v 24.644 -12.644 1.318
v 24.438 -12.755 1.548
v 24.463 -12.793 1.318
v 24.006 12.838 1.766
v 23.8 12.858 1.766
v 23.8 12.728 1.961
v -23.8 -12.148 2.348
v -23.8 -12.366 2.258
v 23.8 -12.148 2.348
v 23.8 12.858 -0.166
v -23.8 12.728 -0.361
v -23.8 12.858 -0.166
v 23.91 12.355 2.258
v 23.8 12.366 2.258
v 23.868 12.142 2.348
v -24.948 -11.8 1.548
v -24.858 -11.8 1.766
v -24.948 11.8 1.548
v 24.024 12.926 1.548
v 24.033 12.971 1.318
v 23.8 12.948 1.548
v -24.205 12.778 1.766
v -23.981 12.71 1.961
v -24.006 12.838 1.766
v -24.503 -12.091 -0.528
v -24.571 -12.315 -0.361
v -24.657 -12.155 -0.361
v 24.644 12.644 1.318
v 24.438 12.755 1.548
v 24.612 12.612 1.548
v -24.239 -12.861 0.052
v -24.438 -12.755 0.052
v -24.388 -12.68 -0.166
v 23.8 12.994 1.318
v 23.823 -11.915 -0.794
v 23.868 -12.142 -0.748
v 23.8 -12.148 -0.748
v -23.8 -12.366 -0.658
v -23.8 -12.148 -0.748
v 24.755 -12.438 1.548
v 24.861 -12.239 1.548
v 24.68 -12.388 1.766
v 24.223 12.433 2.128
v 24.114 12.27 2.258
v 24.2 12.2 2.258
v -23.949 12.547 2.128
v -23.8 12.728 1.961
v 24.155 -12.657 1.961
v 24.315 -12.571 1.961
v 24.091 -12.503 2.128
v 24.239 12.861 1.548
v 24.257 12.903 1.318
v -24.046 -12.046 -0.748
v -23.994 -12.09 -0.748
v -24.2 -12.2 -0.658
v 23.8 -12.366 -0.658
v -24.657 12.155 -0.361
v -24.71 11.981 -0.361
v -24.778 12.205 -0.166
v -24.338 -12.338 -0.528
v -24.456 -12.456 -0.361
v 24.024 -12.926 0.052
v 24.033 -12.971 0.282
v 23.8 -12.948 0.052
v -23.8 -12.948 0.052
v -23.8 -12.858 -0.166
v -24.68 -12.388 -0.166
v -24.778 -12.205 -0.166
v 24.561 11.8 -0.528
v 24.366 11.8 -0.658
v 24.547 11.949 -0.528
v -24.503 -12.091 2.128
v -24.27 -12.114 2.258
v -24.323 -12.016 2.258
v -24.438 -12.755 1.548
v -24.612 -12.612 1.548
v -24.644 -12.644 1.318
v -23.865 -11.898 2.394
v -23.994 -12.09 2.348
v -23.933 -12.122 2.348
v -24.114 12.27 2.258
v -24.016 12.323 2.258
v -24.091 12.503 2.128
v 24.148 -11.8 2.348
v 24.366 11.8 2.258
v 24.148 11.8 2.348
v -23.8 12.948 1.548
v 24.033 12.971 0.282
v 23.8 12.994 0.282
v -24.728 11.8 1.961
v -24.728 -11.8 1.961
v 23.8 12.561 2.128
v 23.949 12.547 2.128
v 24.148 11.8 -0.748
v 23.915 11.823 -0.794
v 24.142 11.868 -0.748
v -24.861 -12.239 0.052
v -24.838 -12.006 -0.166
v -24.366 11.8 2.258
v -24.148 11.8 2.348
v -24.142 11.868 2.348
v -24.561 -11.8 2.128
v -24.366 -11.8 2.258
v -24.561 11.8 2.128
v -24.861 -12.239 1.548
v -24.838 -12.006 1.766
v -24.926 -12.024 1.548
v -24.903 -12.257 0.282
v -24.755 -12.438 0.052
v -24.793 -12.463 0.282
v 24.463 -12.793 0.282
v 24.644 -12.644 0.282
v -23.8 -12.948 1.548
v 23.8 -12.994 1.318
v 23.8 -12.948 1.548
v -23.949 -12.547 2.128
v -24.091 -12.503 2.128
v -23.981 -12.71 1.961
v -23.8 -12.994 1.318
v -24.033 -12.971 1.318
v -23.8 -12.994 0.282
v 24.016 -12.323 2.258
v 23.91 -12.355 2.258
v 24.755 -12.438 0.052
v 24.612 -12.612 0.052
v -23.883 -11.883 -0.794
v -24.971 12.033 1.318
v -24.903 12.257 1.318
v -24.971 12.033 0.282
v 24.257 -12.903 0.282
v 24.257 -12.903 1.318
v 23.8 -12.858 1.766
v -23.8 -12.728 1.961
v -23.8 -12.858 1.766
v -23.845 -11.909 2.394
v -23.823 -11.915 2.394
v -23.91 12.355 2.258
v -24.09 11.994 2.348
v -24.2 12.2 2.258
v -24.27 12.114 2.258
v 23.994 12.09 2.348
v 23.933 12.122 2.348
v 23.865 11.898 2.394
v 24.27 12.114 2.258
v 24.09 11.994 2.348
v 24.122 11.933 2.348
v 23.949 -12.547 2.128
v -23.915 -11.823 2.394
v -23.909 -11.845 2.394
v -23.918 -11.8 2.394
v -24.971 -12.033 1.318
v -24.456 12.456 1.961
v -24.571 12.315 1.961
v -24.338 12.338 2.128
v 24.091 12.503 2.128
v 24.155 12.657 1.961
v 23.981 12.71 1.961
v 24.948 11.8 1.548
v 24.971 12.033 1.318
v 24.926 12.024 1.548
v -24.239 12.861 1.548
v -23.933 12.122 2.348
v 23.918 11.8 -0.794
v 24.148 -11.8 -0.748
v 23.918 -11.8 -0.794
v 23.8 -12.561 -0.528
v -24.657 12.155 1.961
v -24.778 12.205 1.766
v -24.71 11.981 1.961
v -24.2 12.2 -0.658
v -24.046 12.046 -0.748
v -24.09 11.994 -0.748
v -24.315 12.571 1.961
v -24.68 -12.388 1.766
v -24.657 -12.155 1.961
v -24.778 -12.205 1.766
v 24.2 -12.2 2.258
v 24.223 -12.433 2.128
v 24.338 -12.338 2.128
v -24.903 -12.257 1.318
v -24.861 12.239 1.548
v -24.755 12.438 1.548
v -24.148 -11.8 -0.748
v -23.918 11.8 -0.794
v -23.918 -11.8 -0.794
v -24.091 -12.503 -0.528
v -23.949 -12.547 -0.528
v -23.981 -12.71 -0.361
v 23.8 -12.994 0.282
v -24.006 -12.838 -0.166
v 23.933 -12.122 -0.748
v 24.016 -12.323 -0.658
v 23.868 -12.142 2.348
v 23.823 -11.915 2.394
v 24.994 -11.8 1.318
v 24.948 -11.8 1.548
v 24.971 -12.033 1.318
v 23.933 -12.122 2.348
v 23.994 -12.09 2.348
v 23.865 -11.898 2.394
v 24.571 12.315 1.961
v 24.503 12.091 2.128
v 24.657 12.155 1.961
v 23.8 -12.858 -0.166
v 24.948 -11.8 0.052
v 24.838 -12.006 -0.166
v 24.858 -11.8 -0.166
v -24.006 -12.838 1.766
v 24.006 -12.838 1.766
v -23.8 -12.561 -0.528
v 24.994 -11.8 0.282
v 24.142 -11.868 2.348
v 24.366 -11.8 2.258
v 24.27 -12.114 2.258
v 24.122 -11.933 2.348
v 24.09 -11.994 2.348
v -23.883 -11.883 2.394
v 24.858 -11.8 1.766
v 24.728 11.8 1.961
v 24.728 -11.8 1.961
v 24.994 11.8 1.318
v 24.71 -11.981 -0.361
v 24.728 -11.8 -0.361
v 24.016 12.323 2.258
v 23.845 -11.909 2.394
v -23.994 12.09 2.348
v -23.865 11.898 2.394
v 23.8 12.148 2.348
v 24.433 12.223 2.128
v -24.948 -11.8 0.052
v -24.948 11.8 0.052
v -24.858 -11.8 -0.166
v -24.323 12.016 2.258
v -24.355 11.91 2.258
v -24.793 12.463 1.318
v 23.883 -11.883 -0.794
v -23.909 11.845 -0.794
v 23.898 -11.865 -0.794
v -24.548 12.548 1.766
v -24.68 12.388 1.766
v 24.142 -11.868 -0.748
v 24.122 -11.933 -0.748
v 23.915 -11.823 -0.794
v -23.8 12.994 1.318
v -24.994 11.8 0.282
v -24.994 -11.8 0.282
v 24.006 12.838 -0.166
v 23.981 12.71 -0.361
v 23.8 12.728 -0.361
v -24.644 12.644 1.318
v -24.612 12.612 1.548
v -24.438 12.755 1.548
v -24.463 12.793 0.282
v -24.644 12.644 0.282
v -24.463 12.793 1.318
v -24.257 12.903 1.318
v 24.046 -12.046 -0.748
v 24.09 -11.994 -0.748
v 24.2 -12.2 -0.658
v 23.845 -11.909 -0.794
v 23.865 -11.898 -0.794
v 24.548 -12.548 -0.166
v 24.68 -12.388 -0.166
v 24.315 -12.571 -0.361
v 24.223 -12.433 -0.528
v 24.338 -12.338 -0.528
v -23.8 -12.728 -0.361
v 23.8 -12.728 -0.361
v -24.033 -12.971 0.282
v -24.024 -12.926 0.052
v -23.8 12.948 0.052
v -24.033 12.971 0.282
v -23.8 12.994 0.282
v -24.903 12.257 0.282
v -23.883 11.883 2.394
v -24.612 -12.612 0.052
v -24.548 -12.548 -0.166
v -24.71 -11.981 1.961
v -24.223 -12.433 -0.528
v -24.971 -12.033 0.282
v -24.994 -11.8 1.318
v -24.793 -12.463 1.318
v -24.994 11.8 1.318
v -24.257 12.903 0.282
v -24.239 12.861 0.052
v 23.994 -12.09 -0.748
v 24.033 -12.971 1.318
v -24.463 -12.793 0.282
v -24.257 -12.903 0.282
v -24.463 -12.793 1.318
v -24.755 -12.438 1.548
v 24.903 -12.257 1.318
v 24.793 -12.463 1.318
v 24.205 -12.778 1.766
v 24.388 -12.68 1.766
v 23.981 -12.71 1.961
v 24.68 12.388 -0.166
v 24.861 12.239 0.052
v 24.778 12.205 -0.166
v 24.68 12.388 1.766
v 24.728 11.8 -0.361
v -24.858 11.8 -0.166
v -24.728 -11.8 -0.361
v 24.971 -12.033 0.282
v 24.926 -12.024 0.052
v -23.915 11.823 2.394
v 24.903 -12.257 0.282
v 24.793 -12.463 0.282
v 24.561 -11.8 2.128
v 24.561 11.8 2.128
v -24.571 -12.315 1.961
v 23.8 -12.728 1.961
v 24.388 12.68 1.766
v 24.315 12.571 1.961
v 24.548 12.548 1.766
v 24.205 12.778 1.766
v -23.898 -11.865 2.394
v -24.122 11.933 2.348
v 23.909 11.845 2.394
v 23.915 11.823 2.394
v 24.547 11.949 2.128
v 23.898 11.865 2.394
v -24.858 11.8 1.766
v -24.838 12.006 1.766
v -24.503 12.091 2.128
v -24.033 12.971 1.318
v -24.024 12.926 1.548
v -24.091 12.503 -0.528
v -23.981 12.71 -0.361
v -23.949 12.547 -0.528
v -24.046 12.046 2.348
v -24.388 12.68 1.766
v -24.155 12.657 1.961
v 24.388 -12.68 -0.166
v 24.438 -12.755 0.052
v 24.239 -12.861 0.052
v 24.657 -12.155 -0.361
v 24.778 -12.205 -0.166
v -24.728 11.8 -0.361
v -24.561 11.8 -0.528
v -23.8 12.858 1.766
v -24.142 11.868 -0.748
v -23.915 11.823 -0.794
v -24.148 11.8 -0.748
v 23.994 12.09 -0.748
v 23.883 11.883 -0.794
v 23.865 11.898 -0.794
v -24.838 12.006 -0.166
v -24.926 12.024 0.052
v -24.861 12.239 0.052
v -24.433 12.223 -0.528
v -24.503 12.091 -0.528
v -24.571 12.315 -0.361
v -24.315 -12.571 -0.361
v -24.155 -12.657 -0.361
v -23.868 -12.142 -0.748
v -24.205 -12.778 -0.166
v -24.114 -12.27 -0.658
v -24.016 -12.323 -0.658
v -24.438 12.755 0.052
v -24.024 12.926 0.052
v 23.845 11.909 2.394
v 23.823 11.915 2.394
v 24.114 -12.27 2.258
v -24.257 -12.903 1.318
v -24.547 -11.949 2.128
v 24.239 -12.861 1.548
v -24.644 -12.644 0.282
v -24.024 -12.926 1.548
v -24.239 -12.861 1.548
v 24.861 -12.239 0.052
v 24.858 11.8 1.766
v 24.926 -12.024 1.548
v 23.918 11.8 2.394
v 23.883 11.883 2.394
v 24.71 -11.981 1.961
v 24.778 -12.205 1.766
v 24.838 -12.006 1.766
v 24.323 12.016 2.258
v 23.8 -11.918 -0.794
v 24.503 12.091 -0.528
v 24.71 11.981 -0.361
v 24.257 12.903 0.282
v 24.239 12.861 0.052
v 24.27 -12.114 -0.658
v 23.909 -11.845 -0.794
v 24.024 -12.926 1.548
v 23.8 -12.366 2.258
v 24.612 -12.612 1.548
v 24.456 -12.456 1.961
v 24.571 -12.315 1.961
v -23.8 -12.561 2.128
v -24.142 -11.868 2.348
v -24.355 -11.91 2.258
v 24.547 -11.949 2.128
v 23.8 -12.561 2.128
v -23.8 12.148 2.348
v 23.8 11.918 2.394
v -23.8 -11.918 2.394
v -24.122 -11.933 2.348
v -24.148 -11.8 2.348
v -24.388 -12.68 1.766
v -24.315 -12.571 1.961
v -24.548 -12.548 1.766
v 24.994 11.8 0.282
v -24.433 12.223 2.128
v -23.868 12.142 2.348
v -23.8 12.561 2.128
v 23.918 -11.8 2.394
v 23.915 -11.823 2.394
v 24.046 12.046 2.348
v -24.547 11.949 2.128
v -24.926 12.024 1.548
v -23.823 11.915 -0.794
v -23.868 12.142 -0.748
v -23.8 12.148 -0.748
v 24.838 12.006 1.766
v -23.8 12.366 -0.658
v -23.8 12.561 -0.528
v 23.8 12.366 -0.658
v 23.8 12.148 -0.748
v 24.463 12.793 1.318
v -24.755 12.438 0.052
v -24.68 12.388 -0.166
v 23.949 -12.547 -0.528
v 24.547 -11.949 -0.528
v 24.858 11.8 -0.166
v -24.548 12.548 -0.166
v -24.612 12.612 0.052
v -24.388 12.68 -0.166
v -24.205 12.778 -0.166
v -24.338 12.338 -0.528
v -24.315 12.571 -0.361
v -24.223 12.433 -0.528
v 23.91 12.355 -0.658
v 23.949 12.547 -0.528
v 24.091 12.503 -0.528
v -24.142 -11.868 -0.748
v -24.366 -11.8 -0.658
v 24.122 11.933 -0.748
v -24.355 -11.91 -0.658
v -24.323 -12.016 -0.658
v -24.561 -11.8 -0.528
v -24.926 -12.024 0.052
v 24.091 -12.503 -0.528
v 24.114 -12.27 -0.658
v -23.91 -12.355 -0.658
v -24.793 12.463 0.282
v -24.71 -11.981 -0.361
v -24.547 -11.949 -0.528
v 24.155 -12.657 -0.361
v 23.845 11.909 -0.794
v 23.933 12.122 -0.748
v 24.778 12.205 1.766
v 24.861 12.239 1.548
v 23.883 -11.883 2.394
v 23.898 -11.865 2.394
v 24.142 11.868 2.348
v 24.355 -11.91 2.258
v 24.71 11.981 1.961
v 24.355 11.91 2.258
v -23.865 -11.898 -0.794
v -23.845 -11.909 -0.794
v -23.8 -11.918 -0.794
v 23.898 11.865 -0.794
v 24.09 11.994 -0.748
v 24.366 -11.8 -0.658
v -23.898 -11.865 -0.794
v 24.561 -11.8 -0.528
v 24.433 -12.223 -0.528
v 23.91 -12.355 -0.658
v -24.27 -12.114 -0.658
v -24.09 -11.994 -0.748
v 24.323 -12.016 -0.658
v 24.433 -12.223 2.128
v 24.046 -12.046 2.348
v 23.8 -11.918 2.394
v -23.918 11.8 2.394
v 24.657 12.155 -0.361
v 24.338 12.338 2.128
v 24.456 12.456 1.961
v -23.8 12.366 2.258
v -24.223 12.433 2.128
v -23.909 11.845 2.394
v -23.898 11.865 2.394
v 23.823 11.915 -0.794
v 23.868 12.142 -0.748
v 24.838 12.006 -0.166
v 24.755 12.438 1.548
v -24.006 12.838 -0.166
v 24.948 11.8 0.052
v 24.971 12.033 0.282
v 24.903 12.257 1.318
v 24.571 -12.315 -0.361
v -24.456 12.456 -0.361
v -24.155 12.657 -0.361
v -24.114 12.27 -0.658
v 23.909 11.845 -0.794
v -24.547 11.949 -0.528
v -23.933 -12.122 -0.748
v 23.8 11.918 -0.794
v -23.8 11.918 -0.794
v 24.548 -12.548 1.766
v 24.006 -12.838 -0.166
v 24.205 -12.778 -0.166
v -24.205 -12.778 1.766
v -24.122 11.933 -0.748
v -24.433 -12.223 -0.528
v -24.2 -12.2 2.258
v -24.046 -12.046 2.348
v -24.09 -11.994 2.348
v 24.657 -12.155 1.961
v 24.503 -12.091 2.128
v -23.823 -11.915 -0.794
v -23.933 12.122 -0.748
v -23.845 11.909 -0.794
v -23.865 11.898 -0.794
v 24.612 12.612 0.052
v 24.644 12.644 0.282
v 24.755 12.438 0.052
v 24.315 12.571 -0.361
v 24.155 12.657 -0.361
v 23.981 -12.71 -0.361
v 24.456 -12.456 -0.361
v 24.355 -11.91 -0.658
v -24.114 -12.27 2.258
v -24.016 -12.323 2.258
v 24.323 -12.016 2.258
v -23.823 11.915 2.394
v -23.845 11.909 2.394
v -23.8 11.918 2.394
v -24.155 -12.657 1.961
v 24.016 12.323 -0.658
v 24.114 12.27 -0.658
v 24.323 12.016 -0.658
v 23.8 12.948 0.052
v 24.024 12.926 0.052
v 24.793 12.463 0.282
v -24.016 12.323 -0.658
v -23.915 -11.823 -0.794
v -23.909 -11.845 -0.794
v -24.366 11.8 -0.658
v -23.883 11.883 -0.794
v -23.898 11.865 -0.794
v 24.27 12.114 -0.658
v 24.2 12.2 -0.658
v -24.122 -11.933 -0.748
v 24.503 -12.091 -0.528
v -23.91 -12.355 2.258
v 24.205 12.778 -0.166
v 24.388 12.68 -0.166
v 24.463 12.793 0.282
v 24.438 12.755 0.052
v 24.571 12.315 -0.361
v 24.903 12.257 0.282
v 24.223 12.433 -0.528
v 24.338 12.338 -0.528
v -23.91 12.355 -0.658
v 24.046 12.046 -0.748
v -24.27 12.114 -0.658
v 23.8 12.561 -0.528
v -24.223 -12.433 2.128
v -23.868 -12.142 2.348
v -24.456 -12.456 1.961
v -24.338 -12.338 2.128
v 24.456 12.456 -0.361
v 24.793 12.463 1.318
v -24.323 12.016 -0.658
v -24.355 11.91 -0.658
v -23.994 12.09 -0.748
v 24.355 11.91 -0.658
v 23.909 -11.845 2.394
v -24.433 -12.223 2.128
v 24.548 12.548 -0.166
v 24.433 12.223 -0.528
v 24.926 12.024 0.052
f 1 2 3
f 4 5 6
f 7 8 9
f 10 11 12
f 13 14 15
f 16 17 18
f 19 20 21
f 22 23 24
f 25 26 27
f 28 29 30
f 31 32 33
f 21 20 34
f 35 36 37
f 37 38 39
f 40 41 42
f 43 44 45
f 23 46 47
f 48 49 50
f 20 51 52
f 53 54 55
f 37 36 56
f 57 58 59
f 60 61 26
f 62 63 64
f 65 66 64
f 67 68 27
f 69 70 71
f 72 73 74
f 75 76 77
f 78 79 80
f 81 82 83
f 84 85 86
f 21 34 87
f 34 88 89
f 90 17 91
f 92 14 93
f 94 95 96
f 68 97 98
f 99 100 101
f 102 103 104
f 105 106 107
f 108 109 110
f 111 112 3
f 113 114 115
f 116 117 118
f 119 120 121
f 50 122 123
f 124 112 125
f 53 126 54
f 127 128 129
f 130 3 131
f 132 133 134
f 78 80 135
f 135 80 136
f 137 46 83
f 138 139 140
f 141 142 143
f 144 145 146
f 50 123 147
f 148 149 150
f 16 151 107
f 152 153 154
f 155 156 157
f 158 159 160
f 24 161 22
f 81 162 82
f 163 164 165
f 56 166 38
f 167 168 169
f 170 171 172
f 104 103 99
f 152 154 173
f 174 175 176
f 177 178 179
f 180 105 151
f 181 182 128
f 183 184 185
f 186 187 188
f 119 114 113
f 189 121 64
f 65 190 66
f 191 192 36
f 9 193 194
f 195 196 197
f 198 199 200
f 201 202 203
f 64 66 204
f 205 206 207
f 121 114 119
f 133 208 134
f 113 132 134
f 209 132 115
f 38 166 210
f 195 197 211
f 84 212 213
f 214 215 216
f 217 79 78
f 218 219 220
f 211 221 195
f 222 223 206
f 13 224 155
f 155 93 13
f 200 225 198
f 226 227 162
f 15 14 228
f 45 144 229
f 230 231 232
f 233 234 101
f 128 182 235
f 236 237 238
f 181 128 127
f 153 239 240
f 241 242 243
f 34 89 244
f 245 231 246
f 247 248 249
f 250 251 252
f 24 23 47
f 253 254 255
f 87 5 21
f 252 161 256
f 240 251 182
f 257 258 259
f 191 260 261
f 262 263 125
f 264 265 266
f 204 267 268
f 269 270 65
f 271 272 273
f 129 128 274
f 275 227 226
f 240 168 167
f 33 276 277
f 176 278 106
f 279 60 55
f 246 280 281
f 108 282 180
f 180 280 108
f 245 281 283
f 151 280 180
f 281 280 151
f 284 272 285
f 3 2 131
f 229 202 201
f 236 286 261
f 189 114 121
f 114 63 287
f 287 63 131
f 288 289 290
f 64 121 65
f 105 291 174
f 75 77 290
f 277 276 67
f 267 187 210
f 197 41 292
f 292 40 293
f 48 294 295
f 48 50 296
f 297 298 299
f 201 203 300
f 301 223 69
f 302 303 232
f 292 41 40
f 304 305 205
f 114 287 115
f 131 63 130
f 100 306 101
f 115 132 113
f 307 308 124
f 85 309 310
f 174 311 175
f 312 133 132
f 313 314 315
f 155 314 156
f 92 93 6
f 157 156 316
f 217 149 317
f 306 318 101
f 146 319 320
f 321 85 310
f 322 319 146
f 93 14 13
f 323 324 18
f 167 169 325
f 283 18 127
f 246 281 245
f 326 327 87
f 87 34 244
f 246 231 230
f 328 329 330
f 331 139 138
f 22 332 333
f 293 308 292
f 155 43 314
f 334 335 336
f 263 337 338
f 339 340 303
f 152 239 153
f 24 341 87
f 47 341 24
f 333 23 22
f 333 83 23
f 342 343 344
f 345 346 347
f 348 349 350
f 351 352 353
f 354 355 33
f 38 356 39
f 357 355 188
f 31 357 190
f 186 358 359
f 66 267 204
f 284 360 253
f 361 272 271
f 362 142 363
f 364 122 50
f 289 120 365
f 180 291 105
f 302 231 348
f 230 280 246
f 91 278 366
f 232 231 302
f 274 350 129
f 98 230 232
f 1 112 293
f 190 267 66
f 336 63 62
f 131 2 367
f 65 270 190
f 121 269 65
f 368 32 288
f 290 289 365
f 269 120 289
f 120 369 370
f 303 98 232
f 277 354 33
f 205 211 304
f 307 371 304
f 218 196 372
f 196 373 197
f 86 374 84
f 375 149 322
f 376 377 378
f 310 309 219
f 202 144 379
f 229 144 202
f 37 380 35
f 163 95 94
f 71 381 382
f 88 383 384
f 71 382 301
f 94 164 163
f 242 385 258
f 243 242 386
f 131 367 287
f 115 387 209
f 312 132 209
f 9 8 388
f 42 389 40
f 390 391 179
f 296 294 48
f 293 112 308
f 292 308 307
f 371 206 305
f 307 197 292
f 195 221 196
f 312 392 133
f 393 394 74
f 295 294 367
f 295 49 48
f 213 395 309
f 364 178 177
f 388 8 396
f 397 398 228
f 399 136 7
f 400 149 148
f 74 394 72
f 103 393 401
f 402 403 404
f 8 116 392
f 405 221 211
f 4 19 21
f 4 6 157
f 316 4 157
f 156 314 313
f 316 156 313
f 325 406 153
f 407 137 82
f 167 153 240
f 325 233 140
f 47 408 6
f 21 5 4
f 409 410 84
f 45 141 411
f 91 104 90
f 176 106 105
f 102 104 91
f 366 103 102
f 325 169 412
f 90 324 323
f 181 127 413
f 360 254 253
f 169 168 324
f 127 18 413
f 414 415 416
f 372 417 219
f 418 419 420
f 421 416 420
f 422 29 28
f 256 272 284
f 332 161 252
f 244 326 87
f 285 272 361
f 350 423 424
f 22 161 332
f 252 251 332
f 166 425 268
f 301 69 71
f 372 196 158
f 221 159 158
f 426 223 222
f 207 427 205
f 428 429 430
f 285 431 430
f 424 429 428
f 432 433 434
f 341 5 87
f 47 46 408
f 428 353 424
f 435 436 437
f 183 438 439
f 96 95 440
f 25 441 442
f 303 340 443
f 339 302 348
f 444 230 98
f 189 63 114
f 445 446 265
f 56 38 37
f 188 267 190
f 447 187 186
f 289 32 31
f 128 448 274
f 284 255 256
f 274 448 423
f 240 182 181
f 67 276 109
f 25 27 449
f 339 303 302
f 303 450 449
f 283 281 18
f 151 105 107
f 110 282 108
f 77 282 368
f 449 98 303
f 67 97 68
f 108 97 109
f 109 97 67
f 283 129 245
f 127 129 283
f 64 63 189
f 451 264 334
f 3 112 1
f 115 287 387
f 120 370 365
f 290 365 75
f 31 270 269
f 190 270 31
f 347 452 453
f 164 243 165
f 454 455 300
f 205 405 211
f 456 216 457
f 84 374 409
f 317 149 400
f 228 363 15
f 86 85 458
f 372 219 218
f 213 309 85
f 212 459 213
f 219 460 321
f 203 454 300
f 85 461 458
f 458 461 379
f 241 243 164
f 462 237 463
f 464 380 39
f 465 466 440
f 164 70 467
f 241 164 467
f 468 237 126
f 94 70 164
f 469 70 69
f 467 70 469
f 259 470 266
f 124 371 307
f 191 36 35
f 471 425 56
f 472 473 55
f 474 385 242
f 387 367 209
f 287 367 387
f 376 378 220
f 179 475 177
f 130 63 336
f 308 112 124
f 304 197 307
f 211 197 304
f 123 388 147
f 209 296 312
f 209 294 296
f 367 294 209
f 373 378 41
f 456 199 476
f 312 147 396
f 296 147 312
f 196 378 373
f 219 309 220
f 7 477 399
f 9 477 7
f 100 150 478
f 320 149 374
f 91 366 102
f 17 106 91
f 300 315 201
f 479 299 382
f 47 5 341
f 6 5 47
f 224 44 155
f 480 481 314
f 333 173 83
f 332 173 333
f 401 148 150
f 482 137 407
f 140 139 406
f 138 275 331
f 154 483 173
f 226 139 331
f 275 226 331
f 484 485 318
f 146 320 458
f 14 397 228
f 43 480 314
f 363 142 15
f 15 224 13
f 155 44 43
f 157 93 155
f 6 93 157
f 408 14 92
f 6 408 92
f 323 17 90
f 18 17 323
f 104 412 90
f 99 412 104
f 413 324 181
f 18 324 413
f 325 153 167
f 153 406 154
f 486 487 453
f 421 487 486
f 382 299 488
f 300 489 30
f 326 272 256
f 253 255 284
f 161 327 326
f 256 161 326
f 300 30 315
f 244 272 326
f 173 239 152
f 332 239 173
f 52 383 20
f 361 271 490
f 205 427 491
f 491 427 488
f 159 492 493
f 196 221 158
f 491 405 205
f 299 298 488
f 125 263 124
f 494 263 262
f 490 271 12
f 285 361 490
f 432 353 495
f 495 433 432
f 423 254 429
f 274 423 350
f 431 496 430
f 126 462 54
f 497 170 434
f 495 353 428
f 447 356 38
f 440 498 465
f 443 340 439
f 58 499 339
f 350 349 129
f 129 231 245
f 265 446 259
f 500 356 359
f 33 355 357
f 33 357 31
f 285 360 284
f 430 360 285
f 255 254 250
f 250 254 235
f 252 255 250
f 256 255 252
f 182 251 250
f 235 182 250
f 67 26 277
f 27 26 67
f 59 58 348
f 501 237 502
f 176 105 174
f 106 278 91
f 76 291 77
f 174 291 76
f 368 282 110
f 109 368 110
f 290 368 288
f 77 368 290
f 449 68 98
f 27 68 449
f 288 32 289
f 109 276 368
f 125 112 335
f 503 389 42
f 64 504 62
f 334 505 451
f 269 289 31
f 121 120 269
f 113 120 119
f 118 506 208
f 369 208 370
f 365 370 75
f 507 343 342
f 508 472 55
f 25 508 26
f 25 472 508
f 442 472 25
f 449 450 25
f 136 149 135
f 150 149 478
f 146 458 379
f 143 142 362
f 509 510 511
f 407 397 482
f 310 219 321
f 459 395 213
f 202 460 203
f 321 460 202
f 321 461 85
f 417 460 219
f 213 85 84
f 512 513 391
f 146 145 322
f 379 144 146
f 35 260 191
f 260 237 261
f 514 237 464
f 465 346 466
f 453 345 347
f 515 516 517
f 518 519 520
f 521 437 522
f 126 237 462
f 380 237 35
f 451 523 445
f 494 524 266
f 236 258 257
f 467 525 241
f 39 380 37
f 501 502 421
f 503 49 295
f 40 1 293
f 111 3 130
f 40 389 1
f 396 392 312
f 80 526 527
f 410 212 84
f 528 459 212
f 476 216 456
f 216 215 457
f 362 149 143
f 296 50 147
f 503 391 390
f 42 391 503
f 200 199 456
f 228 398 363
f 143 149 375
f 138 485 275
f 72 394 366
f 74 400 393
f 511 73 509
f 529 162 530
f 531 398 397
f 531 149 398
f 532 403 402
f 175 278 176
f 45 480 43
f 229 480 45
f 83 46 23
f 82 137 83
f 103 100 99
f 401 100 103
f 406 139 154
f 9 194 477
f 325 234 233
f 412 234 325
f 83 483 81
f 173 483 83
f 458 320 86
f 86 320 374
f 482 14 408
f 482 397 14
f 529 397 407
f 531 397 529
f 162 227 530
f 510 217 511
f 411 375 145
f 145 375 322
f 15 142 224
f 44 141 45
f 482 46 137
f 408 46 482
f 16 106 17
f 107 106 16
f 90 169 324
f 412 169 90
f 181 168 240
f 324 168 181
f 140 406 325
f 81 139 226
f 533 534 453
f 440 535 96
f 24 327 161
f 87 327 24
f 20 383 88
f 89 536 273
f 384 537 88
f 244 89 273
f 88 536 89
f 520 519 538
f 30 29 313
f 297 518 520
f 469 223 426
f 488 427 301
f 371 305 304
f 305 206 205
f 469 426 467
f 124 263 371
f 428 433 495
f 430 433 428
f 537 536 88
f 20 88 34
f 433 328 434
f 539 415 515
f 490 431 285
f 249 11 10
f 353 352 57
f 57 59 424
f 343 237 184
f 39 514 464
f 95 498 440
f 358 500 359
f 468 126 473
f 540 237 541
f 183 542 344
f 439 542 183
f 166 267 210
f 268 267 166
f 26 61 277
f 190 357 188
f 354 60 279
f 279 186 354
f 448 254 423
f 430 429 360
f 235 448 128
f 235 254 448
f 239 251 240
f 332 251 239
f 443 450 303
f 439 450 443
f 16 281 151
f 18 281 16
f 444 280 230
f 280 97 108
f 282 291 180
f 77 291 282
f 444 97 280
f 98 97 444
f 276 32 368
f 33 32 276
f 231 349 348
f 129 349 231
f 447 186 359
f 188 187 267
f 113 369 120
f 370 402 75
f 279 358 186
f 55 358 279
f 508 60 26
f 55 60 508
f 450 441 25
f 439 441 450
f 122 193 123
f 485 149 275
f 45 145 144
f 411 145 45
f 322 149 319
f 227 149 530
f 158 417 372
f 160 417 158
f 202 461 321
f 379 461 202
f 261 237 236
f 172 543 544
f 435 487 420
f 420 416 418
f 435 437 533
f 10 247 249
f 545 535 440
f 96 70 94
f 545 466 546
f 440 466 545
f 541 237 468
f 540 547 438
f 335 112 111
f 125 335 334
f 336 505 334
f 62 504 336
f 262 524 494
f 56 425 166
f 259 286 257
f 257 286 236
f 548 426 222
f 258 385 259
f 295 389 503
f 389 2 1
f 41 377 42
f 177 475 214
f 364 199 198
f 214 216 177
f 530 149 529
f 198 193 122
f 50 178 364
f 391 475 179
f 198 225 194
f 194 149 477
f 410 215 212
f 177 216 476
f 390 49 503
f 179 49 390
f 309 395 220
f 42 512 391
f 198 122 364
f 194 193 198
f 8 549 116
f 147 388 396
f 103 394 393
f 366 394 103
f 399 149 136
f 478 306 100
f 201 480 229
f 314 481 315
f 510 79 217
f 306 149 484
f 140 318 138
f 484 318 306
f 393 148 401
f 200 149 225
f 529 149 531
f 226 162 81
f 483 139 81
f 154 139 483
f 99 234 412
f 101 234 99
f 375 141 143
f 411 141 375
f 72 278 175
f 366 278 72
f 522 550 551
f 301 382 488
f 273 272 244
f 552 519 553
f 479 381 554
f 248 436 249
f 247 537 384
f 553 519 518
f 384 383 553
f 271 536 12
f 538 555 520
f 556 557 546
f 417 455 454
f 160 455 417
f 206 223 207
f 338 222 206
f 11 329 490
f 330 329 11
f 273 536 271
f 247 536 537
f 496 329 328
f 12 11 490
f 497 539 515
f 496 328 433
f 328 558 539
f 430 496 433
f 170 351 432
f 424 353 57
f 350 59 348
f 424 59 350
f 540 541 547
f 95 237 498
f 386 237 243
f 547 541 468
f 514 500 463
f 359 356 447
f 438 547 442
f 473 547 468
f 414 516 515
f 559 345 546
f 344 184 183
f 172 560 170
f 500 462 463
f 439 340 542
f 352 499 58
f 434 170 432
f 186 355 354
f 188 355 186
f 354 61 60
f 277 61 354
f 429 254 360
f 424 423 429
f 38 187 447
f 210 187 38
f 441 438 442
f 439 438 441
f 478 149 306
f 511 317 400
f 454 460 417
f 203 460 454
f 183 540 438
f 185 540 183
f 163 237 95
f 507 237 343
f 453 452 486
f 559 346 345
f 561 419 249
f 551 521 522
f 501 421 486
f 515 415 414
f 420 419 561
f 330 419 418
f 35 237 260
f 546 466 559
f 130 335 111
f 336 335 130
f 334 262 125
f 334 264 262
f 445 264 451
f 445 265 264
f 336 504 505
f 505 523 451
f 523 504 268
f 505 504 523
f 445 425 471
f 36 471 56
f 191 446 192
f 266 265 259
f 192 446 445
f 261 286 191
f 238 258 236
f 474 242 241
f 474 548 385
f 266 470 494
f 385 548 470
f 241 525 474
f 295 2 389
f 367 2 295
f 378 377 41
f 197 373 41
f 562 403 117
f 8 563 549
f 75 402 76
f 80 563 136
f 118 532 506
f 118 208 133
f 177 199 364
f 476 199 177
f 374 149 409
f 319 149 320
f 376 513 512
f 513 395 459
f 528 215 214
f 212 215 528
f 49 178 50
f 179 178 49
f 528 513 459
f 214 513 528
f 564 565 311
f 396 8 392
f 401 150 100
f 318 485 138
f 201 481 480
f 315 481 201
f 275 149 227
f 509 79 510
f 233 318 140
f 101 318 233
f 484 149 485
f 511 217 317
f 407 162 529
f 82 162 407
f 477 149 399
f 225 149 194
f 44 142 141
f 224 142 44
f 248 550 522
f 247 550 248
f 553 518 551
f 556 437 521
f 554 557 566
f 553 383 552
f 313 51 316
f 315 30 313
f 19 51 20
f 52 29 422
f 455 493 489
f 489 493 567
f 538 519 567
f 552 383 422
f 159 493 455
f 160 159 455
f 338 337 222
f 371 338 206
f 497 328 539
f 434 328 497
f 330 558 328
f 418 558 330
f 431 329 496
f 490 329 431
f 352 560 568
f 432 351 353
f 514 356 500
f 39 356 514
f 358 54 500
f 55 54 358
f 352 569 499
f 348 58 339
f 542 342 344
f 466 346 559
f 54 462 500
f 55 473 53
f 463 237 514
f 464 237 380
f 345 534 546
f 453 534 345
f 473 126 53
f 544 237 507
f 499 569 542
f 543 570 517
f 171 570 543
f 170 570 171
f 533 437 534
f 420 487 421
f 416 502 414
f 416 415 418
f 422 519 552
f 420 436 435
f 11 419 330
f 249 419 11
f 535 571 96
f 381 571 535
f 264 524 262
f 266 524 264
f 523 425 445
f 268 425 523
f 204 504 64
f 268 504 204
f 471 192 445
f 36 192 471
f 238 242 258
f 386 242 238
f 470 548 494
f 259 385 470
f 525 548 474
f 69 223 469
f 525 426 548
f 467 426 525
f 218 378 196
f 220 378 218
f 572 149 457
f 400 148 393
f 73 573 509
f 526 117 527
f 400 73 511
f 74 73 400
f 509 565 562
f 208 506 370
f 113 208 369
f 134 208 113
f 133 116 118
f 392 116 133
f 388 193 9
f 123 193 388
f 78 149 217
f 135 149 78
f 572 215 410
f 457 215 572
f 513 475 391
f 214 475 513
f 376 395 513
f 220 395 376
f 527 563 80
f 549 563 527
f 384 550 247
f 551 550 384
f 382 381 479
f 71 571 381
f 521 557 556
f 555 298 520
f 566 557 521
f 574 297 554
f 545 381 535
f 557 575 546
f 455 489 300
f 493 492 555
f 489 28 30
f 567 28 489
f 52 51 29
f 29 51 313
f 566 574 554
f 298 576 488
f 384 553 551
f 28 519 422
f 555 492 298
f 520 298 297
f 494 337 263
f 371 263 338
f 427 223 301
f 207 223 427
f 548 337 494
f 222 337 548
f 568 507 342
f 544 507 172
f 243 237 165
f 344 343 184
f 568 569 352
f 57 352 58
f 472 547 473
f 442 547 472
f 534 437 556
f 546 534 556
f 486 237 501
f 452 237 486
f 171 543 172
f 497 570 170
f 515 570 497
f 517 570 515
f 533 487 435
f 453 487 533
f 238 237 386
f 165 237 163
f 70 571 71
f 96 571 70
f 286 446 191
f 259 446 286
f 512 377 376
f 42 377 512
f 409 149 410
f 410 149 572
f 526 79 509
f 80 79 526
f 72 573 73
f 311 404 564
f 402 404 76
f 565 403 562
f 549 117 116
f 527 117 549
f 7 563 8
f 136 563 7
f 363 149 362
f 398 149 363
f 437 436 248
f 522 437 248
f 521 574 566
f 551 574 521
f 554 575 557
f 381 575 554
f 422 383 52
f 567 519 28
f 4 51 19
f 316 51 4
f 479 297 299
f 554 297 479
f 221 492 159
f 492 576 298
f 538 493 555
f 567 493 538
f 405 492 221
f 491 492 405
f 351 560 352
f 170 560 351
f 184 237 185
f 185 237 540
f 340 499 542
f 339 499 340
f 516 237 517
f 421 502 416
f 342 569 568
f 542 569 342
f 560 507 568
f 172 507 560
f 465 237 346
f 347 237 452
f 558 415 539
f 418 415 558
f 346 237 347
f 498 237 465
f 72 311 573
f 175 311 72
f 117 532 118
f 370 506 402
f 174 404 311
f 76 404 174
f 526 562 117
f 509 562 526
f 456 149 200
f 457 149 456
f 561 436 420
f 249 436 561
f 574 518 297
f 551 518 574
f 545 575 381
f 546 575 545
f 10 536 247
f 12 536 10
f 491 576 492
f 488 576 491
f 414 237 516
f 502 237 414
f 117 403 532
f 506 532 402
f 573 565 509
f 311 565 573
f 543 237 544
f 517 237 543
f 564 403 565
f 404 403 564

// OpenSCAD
// Relay 1CH (1 路繼電器模組) visual source for NexCAD.
// Units: millimeters. Origin: part bottom-center, matching src/parts/library.ts.
// This generated baseline is intentionally simple; refine it with measured details before exporting STL.

$fn = 32;

module rounded_box(size, r = 0.8) {
  hull() {
    for (x = [-size[0] / 2 + r, size[0] / 2 - r])
      for (y = [-size[1] / 2 + r, size[1] / 2 - r]) {
        translate([x, y, r]) sphere(r = r);
        translate([x, y, size[2] - r]) sphere(r = r);
      }
  }
}

color("#2e7d5b") rounded_box([50, 26, 1.6], min(1.2, min(50, 26) / 8));
